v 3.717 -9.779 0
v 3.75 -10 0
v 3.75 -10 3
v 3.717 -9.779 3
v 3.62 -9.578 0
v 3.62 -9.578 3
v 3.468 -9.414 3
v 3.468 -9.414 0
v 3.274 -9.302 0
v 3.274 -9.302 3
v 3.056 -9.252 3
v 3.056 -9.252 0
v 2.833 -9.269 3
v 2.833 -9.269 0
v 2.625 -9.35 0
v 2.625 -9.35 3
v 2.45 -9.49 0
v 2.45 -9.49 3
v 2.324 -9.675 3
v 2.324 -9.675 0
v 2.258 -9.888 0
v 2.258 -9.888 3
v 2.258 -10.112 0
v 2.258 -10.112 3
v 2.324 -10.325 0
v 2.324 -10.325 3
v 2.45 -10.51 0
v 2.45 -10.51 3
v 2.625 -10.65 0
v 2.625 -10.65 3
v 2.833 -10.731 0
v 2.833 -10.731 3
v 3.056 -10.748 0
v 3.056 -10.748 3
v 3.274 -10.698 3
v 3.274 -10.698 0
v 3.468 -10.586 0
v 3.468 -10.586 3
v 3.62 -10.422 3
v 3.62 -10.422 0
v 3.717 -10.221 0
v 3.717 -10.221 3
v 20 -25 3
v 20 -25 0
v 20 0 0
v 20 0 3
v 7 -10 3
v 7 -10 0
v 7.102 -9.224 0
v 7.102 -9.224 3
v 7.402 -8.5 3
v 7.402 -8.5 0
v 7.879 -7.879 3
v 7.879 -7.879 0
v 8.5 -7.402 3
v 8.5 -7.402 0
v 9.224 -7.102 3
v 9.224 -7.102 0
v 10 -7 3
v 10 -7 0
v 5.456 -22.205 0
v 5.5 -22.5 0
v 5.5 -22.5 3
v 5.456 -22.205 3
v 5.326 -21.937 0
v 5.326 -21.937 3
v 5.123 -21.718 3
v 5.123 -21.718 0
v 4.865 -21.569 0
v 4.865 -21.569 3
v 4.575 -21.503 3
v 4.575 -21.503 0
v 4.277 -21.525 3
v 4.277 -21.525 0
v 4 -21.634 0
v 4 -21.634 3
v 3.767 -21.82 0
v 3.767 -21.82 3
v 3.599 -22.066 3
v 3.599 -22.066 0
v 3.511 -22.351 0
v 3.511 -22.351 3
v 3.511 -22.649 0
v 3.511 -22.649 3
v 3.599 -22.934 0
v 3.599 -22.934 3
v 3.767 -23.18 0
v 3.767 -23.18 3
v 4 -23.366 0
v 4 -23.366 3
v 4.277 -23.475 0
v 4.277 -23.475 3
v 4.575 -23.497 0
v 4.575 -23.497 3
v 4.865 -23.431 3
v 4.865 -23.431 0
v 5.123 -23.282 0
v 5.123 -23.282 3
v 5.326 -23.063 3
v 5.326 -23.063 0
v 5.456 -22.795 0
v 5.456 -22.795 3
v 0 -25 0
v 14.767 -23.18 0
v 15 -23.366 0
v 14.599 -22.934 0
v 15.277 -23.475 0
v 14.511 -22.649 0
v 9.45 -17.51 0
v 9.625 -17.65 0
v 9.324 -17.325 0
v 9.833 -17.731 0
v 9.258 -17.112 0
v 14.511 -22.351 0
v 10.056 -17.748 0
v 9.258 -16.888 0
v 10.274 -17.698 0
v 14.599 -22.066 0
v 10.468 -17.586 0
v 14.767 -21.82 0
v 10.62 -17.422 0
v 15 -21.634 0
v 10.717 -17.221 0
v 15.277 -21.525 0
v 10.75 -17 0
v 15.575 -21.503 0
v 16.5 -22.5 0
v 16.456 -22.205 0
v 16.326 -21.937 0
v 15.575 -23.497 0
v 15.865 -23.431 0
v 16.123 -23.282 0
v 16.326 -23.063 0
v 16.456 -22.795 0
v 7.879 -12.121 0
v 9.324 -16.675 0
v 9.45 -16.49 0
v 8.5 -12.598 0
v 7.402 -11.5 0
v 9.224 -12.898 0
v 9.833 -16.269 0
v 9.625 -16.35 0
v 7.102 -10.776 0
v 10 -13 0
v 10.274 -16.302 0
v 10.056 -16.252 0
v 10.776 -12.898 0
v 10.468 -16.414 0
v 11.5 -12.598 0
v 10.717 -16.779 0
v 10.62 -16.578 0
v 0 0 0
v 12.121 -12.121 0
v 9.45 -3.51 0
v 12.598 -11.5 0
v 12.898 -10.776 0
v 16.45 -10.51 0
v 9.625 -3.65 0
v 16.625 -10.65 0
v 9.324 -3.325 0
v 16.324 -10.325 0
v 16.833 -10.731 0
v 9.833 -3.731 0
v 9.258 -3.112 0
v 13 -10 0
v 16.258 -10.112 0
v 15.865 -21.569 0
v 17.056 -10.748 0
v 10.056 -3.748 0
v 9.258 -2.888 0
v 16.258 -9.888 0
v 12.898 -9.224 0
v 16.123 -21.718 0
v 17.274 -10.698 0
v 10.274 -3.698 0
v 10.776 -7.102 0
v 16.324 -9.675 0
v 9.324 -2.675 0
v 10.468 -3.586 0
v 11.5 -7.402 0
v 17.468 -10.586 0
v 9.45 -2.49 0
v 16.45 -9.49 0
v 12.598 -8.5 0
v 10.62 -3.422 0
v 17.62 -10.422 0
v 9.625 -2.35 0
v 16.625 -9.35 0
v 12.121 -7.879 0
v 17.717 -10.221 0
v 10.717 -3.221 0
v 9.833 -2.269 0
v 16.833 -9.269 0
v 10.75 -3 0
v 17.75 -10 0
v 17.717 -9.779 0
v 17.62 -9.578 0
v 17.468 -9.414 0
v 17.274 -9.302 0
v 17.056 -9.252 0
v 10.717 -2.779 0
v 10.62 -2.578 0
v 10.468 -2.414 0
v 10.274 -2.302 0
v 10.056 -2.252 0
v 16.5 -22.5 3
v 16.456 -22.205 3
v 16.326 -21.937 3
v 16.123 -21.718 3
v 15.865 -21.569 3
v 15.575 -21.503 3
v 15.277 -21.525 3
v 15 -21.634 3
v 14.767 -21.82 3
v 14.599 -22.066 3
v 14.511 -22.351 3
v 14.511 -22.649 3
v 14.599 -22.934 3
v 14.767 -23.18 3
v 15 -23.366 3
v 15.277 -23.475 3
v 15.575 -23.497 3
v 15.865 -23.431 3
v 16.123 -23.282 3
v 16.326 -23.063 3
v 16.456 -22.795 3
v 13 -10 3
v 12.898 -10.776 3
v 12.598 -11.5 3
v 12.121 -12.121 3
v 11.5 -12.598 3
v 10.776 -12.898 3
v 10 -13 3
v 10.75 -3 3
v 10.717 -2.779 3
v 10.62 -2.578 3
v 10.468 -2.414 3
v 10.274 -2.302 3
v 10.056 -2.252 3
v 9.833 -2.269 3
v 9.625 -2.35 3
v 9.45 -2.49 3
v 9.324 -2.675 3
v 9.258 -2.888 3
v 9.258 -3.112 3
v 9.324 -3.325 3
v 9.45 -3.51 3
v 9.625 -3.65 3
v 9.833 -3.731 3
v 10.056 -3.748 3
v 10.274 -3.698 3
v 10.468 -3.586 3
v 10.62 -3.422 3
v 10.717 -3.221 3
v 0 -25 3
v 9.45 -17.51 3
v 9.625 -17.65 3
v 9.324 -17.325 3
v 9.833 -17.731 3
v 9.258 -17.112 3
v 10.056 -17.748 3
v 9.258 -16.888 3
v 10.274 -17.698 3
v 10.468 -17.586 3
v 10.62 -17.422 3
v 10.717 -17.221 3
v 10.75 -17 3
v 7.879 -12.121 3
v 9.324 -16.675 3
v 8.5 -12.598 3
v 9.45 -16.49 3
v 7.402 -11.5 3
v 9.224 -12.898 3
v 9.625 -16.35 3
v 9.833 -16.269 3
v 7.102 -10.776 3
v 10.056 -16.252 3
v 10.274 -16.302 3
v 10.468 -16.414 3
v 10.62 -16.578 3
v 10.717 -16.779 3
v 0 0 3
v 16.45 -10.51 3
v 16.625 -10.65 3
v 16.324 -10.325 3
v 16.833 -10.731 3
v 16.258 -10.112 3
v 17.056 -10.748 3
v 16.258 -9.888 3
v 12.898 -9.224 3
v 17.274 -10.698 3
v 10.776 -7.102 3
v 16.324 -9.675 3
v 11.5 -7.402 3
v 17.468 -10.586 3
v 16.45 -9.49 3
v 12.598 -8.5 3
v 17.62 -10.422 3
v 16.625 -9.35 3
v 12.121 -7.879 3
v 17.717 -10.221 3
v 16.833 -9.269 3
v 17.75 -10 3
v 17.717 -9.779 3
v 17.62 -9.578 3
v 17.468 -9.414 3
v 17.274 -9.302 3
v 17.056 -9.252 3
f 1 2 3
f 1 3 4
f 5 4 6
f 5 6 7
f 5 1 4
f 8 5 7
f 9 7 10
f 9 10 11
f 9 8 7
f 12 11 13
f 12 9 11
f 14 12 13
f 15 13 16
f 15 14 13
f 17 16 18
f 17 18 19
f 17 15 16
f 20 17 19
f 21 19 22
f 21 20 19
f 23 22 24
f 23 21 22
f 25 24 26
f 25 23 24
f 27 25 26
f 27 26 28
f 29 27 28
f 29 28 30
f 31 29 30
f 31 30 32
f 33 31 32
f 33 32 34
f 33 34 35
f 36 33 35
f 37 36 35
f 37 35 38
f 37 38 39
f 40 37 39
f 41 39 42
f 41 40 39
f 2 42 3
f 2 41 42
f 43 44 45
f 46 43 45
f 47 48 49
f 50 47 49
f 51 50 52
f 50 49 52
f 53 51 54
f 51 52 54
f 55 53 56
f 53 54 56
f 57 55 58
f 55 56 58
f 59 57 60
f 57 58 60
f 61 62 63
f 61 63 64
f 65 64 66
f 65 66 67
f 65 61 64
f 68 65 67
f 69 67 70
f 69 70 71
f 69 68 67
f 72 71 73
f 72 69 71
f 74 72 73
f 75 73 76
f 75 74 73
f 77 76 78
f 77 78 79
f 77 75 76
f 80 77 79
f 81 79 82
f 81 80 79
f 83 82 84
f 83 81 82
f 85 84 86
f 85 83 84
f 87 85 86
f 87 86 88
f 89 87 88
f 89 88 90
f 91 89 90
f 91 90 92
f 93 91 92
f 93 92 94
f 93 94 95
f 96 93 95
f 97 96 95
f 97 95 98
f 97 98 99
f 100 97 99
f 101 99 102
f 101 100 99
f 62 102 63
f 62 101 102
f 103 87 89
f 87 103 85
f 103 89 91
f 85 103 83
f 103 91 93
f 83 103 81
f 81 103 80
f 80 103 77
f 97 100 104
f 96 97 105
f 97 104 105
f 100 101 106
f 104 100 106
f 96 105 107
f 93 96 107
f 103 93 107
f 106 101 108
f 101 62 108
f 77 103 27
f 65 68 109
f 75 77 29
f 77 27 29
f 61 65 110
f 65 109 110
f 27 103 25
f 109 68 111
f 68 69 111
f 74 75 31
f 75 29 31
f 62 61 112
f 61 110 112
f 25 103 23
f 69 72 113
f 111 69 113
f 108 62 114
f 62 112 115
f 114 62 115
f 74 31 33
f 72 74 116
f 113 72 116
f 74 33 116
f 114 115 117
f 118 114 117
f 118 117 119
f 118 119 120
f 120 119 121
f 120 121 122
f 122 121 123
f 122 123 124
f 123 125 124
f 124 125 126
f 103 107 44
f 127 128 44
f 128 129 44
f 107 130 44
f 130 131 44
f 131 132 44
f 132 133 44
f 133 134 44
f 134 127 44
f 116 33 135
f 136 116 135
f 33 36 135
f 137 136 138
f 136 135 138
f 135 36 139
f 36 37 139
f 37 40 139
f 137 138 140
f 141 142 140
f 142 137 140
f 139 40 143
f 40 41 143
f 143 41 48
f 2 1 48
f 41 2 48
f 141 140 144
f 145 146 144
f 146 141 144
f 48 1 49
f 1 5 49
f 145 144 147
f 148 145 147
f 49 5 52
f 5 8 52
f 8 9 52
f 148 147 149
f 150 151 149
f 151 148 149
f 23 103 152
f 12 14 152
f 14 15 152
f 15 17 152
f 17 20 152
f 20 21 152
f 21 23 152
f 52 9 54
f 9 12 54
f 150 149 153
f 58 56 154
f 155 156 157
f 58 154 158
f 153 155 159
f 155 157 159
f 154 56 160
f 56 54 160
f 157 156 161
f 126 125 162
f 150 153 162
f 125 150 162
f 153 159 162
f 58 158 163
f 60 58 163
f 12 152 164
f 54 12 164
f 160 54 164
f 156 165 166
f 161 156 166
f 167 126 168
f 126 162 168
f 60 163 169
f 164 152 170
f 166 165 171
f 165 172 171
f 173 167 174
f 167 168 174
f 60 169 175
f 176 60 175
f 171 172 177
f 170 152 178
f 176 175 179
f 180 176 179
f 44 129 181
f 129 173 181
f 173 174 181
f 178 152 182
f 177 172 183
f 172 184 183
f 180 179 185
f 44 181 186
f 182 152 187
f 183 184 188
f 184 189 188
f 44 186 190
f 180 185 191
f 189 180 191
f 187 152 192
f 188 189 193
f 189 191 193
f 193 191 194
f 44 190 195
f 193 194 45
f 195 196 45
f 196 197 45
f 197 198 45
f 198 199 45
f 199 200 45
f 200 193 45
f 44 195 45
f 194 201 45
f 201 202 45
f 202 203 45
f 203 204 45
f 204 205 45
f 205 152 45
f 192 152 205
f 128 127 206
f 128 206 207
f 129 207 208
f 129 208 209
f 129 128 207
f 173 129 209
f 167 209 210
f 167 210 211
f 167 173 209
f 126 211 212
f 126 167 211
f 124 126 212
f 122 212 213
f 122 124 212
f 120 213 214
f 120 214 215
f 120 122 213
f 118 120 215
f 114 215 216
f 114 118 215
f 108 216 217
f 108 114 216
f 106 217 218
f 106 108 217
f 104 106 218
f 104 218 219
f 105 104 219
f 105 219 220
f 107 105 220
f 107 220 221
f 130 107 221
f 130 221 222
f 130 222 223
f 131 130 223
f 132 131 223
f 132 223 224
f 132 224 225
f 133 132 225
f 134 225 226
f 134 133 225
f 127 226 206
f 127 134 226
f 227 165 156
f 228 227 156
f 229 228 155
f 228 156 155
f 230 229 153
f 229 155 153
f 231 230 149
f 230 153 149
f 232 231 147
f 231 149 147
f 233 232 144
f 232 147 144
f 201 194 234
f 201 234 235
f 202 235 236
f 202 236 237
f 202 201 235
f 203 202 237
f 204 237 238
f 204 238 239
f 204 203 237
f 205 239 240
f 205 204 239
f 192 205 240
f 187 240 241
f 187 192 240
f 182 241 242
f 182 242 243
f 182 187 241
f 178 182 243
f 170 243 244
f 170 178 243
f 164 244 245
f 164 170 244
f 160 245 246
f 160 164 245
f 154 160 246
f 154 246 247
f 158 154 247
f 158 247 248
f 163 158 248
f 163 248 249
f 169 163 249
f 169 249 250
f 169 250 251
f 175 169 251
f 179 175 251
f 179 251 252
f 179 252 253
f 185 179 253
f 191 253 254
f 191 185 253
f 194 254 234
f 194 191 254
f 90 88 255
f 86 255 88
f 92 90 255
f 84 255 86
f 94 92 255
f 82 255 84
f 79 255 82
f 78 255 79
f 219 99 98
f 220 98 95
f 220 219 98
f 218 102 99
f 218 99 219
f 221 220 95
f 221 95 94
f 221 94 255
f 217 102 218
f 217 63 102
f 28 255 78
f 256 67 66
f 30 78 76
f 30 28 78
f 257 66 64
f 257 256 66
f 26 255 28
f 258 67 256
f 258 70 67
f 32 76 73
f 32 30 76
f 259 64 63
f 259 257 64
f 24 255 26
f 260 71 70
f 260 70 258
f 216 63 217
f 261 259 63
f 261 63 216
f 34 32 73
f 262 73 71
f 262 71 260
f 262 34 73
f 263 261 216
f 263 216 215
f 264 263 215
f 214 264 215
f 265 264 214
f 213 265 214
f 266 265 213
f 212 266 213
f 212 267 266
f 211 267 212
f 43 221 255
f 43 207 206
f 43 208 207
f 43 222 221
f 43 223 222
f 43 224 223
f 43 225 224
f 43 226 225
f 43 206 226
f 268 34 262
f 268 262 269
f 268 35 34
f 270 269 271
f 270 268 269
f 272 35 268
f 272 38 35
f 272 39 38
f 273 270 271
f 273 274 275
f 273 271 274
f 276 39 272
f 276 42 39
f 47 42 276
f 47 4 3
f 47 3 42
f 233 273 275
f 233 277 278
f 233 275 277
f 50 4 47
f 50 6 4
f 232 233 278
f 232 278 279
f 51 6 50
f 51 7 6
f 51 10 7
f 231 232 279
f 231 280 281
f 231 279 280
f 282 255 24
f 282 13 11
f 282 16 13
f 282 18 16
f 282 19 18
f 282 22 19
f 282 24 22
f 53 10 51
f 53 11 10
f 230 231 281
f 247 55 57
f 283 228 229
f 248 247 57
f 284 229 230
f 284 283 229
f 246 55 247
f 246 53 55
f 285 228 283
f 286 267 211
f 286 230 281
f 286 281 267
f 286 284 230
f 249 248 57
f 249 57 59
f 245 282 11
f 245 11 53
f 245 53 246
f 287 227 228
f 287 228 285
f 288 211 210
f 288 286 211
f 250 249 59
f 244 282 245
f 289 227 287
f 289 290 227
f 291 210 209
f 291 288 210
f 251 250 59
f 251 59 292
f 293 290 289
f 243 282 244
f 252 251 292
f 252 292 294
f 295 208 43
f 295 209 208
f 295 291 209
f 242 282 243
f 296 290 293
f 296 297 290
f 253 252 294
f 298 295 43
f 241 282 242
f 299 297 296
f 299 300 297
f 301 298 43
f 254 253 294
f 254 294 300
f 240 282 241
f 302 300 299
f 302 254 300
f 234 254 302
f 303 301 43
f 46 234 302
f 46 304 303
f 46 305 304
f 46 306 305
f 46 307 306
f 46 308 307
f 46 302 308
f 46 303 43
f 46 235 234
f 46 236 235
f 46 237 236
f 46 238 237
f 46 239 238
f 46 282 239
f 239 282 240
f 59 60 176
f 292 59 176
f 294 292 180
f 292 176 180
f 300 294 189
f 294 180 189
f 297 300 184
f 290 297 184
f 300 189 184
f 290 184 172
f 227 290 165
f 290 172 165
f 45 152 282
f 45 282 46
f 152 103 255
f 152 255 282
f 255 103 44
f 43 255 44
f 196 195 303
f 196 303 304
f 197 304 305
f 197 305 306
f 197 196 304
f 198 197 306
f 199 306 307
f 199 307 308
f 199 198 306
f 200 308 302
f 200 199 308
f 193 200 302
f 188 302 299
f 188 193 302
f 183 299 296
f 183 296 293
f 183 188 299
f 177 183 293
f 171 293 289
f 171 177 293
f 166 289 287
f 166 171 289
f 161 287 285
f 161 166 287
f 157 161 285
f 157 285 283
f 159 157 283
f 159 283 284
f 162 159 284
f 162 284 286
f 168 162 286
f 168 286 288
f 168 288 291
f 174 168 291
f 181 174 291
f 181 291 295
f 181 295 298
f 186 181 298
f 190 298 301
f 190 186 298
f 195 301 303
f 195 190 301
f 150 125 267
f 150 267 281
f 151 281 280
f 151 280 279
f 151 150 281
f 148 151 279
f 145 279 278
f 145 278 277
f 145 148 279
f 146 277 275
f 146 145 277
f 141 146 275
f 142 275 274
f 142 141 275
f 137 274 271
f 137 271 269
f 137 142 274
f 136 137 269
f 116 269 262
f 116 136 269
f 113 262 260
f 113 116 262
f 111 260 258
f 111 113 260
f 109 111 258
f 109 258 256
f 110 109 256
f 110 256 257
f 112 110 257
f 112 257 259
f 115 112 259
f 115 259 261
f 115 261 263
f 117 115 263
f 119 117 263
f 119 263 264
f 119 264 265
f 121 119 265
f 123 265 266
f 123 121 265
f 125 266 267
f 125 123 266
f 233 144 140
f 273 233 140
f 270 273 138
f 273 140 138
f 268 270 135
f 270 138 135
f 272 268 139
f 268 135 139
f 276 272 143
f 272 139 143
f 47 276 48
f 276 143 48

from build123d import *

# Parameters (mm, degrees)
SKETCH1_W           = 20
SKETCH1_H           = 25
SKETCH1_R           = 0.75
SKETCH1_R_2         = 1
BOSS_EXTRUDE1_DEPTH = 3


with BuildPart() as part:
    # Sketch1 → Boss-Extrude1 (new body)
    with BuildSketch(Plane.XY):
        with Locations((10, -12.5)):
            Rectangle(SKETCH1_W, SKETCH1_H)
        with Locations((10, -17)):
            Circle(SKETCH1_R, mode=Mode.SUBTRACT)
        with Locations((3, -10)):
            Circle(SKETCH1_R, mode=Mode.SUBTRACT)
        with BuildLine():
            ThreePointArc((10, -7), (12.121320344, -7.878679656), (13, -10))
            ThreePointArc((13, -10), (12.121320344, -12.121320344), (10, -13))
            ThreePointArc((10, -13), (7.878679656, -12.121320344), (7, -10))
            ThreePointArc((7, -10), (7.878679656, -7.878679656), (10, -7))
        make_face(mode=Mode.SUBTRACT)
        with Locations((10, -3)):
            Circle(SKETCH1_R, mode=Mode.SUBTRACT)
        with Locations((17, -10)):
            Circle(SKETCH1_R, mode=Mode.SUBTRACT)
        with Locations((4.5, -22.5)):
            Circle(SKETCH1_R_2, mode=Mode.SUBTRACT)
        with Locations((15.5, -22.5)):
            Circle(SKETCH1_R_2, mode=Mode.SUBTRACT)
    extrude(amount=BOSS_EXTRUDE1_DEPTH)


solid = part.part
